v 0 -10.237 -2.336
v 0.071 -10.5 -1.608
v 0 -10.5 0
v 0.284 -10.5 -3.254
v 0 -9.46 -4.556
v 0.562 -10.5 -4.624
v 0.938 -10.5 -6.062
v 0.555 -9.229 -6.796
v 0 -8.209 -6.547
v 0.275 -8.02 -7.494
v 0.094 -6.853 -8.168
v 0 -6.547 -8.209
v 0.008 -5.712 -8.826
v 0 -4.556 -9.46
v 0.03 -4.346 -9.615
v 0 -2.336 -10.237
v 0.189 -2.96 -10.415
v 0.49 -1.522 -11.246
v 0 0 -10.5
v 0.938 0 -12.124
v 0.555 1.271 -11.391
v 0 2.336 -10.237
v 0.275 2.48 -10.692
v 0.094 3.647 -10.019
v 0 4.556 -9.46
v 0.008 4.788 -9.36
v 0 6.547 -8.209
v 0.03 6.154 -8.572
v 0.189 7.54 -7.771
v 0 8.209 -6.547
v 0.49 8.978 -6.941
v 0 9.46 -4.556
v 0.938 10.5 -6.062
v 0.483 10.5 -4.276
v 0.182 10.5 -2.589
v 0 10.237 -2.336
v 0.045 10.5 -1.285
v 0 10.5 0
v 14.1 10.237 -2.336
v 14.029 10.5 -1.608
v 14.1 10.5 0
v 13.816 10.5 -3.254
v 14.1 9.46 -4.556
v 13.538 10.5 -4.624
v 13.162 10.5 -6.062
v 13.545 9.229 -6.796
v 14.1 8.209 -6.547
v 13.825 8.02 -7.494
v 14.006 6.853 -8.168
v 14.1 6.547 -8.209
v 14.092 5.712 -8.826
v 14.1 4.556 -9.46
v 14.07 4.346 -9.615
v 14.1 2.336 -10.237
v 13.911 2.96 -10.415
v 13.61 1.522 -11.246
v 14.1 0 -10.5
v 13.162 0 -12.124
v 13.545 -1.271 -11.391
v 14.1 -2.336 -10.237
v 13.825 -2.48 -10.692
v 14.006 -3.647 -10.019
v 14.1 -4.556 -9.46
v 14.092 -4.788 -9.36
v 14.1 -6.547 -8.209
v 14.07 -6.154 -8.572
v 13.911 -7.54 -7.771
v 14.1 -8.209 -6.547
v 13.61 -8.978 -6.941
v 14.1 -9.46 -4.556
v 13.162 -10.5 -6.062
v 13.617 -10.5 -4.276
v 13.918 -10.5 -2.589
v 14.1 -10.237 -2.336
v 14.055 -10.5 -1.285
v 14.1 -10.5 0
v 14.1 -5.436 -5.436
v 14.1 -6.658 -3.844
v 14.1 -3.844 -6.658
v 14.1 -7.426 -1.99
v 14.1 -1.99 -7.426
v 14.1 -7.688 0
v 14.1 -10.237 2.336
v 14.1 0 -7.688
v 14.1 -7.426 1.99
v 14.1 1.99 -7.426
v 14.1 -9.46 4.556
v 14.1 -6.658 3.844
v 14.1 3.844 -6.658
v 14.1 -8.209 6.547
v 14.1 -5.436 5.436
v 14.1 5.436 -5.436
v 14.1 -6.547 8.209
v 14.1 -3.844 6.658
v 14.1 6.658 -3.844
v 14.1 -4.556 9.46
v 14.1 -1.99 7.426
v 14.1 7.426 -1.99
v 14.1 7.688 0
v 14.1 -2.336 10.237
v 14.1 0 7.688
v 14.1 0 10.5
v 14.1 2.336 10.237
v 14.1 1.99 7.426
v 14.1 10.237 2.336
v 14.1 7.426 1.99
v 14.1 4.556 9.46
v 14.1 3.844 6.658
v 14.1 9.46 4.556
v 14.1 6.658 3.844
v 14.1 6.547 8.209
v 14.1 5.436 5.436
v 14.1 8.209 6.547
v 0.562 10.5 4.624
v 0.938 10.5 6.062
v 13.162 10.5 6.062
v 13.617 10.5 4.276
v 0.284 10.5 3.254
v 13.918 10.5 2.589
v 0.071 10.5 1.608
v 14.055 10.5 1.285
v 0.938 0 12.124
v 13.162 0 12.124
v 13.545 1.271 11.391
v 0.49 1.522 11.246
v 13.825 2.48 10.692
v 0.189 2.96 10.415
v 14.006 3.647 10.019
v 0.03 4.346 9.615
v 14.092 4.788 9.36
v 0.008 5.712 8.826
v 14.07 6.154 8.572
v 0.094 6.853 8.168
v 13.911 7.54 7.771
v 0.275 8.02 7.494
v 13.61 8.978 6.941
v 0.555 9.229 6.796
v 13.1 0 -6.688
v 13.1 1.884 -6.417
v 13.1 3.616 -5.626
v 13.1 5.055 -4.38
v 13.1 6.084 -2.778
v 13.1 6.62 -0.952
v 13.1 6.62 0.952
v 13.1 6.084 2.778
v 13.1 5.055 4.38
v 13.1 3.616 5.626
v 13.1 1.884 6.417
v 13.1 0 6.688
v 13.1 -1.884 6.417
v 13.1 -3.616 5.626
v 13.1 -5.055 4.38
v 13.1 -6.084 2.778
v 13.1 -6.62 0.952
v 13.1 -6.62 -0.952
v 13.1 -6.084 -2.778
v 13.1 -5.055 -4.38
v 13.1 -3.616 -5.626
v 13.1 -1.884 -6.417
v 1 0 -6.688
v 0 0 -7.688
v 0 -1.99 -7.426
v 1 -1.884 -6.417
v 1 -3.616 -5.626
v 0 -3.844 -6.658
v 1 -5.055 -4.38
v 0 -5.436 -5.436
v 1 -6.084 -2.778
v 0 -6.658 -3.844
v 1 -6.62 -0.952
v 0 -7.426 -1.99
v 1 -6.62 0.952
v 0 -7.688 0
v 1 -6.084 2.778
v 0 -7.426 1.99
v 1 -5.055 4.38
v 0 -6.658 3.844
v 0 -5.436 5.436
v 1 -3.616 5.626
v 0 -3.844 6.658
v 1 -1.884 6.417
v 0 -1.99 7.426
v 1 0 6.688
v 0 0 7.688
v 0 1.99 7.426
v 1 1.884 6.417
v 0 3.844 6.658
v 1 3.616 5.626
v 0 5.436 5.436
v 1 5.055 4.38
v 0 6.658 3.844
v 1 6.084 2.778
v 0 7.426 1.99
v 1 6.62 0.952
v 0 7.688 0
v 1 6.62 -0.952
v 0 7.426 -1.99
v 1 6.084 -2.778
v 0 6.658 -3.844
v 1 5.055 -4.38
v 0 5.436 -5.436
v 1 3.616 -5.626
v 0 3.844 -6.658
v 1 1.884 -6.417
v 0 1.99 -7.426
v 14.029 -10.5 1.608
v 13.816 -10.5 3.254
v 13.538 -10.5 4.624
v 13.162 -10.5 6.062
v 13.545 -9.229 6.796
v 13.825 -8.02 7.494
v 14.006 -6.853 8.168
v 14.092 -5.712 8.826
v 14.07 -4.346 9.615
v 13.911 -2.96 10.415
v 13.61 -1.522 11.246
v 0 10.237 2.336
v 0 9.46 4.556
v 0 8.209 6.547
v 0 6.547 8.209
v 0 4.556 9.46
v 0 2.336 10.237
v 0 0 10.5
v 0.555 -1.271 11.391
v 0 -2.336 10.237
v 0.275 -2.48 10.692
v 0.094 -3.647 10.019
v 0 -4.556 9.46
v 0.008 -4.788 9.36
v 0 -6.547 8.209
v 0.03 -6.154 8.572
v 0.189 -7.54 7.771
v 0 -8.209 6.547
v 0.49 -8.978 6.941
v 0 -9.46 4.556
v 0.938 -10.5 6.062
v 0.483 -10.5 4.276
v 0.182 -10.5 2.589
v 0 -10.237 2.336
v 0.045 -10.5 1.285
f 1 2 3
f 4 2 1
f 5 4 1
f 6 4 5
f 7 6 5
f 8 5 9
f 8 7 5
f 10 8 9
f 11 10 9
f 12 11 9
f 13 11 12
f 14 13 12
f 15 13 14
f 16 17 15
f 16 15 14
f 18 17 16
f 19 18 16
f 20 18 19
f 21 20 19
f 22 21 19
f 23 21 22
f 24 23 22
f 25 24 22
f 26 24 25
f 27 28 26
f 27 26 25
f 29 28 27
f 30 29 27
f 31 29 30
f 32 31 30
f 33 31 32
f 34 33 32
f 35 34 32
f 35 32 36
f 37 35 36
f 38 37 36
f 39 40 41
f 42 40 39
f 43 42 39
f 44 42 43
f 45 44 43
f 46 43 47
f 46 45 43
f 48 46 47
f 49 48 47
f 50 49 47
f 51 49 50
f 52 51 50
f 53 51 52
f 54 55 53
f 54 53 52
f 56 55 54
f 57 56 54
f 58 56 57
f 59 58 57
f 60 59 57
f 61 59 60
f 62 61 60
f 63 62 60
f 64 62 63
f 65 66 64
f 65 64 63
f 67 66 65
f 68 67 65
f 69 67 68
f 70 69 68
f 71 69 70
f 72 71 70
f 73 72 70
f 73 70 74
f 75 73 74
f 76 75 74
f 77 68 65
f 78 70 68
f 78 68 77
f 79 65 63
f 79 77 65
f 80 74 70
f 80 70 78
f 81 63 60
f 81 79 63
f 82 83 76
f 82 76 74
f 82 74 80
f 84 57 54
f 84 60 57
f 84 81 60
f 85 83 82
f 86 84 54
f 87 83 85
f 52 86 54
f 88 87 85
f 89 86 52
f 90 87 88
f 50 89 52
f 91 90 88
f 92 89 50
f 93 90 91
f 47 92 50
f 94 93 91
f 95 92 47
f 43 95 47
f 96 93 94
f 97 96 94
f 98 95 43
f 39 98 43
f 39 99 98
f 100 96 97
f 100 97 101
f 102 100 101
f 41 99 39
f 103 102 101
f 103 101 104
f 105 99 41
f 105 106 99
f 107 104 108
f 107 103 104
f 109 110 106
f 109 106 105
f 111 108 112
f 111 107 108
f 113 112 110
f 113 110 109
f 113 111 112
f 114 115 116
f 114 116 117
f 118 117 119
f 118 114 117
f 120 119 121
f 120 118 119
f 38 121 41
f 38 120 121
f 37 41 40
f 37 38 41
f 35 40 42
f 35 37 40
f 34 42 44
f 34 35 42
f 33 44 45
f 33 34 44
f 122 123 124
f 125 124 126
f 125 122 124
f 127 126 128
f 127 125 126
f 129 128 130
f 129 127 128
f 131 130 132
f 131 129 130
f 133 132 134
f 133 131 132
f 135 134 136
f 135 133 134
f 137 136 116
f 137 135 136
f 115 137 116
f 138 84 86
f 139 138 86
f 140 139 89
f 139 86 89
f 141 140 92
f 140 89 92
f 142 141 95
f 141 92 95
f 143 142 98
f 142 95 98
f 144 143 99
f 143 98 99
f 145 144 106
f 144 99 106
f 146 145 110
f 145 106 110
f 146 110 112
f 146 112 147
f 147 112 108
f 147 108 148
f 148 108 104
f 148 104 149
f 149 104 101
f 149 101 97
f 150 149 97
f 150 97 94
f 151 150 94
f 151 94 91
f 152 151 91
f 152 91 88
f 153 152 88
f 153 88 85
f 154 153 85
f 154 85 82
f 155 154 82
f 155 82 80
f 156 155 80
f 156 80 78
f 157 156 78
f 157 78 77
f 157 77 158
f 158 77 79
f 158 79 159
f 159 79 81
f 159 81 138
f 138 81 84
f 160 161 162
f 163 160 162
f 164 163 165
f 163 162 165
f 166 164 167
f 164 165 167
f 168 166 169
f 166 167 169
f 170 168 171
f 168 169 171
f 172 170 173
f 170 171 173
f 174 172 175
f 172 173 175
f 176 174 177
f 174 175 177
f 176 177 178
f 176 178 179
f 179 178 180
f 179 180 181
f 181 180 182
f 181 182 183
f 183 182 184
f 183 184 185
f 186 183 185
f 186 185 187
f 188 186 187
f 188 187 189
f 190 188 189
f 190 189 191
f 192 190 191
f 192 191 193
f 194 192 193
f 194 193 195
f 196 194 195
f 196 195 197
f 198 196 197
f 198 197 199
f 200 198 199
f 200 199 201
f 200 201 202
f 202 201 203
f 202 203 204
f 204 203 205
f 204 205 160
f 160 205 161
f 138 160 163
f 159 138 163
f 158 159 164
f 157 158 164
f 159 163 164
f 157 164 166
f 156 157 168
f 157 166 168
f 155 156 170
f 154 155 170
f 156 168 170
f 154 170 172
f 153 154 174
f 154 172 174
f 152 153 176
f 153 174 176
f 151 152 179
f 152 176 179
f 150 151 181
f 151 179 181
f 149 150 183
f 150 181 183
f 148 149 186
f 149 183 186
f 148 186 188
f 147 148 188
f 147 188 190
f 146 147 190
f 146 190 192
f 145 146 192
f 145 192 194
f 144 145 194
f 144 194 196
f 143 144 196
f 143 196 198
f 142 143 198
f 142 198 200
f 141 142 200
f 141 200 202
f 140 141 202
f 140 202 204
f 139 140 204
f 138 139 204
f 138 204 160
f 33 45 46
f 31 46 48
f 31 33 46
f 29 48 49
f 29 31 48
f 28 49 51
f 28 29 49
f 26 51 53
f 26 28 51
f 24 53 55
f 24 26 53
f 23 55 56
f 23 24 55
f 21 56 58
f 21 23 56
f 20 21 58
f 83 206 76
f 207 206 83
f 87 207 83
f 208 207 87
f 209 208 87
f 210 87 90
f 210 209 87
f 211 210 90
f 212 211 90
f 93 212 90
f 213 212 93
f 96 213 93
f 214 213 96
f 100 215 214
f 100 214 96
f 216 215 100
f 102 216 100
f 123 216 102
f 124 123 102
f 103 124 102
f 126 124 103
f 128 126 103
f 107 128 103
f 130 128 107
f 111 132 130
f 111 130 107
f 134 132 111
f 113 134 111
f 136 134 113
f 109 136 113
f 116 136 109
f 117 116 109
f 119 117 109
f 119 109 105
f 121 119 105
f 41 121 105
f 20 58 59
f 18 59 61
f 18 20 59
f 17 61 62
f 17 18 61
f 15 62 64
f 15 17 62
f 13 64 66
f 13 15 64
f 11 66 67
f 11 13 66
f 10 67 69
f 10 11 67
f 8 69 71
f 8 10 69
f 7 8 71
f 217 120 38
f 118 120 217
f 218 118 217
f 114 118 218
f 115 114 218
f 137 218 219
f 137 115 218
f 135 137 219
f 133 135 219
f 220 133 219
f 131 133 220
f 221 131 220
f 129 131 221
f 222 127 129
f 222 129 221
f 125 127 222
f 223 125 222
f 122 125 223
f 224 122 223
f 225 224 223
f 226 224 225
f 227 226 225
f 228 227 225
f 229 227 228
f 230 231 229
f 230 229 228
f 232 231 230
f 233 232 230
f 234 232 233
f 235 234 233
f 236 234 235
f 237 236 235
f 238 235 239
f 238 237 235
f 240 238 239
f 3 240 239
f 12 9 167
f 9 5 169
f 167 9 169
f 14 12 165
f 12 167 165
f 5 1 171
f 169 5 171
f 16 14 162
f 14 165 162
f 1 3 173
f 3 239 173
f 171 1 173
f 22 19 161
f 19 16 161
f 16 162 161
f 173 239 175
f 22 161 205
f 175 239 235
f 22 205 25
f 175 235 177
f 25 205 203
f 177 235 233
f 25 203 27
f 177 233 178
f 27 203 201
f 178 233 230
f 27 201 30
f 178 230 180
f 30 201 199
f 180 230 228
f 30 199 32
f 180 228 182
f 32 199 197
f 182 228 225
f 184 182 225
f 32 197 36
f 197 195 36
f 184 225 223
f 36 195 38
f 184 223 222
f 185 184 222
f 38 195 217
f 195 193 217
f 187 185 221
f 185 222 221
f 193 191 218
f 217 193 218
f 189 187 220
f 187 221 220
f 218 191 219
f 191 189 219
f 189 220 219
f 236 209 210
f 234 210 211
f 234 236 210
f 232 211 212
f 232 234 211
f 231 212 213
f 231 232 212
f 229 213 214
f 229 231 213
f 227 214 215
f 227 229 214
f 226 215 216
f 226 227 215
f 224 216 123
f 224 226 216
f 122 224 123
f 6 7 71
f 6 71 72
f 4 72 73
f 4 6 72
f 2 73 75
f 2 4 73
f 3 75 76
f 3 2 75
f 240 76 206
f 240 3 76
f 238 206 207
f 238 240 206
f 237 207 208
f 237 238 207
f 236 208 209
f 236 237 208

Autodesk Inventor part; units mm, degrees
sketch "Sketch1" plane through (0, 0, 0) normal (1, 0, 0) x (0, 1, 0)
  line L0 (10.5, 6.0622) -> (10.5, -6.0622)
  line L1 (10.5, -6.0622) -> (0, -12.1244)
  line L2 (0, -12.1244) -> (-10.5, -6.0622)
  line L3 (-10.5, -6.0622) -> (-10.5, 6.0622)
  line L4 (-10.5, 6.0622) -> (0, 12.1244)
  line L5 (0, 12.1244) -> (10.5, 6.0622)
  circle A0 centre (0, 0) radius 10.5 construction
  dimension "d0" = 21
extrude "Extrusion1" add sketch "Sketch1" along normal blind 14.1
sketch "Sketch2" plane through (14.1, 0, 0) normal (1, 0, 0) x (0, 1, 0)
  line L0 (-10.5, 6.0622) -> (0, 12.1244) projected
  line L1 (0, -12.1244) -> (-10.5, -6.0622) projected
  line L2 (-10.5, 6.0622) -> (10.5, -6.0622) construction
  line L3 (-10.5, -6.0622) -> (10.5, 6.0622) construction
  point P0 (0, 0)
hole "Hole1" at (14.1, 0, 0) direction (-1, 0, 0) diameter 13.3762 end through all thread size "M15x1.5" class "6H" standard "ISO Metric profile"
chamfer "Chamfer1" distance 1 angle 45 2 edges at (14.1, 0, 6.6881) (0, 0, 6.6881)
sketch "Sketch3" plane through (0, 0, 0) normal (0, 1, 0) x (-1, 0, 0)
  line L0 (-17.0915, 0) -> (3.8489, 0) projected
  line L1 (-5.7048, 0) -> (0.8574, 0)
  line L2 (-14.1, 0) -> (-14.1, -12.1244)
  line L3 (-14.1, -12.1244) -> (0, -12.1244)
  line L4 (0, -12.1244) -> (0, 0)
  line L5 (-14.1, -6.0622) -> (-14.1, -12.1244) projected
  line L6 (0, -6.0622) -> (0, -12.1244) projected
  line L7 (0, -12.1244) -> (-14.1, -12.1244) projected
  line L8 (-14.1, -10.5) -> (-13.1622, -12.1244)
  line L9 (-14.1, -12.1244) -> (-14.1, -10.5)
  line L10 (-14.1, -12.1244) -> (-13.1622, -12.1244)
  line L11 (0, -10.5) -> (-0.9378, -12.1244)
  line L12 (-0.9378, -12.1244) -> (0, -12.1244)
  line L13 (0, -12.1244) -> (0, -10.5)
  dimension "d32" = 10.5
  dimension "d33" = 30
revolve "Revolution1" cut sketch "Sketch3" angle 360 about axis through (0, 0, 0) along (-1, 0, 0) contours L8 L3 L2 | L4 L3 L11
ref_plane "MSC_PT1" through (14.1, 0, 0) normal (1, 0, 0) x (0, 1, 0)
ref_plane "MSC_PT2" through (0, 0, 0) normal (-1, 0, 0) x (0, -1, 0)
ref_plane "MSC_PF1" through (0, 0, 0) normal (1, 0, 0) x (0, 1, 0)
equation "\"d0\" = Smax"
equation "\"d1\" = Mmax"
equation "\"d10\" = 0.5 * PTC"
equation "\"d32\" = 0.5 * Smax"
equation "\"NND\" = 14"
equation "\"Smax\" = 21"
equation "\"Mmax\" = 14.1"
equation "\"PTC\" = 2"
equation "\"THREADDIA\" = NND"
equation "\"TEMPLATE\" = 1.2345"
properties part number "ANSI B18.2.4.2M - M14x2" material "Steel, Mild"
